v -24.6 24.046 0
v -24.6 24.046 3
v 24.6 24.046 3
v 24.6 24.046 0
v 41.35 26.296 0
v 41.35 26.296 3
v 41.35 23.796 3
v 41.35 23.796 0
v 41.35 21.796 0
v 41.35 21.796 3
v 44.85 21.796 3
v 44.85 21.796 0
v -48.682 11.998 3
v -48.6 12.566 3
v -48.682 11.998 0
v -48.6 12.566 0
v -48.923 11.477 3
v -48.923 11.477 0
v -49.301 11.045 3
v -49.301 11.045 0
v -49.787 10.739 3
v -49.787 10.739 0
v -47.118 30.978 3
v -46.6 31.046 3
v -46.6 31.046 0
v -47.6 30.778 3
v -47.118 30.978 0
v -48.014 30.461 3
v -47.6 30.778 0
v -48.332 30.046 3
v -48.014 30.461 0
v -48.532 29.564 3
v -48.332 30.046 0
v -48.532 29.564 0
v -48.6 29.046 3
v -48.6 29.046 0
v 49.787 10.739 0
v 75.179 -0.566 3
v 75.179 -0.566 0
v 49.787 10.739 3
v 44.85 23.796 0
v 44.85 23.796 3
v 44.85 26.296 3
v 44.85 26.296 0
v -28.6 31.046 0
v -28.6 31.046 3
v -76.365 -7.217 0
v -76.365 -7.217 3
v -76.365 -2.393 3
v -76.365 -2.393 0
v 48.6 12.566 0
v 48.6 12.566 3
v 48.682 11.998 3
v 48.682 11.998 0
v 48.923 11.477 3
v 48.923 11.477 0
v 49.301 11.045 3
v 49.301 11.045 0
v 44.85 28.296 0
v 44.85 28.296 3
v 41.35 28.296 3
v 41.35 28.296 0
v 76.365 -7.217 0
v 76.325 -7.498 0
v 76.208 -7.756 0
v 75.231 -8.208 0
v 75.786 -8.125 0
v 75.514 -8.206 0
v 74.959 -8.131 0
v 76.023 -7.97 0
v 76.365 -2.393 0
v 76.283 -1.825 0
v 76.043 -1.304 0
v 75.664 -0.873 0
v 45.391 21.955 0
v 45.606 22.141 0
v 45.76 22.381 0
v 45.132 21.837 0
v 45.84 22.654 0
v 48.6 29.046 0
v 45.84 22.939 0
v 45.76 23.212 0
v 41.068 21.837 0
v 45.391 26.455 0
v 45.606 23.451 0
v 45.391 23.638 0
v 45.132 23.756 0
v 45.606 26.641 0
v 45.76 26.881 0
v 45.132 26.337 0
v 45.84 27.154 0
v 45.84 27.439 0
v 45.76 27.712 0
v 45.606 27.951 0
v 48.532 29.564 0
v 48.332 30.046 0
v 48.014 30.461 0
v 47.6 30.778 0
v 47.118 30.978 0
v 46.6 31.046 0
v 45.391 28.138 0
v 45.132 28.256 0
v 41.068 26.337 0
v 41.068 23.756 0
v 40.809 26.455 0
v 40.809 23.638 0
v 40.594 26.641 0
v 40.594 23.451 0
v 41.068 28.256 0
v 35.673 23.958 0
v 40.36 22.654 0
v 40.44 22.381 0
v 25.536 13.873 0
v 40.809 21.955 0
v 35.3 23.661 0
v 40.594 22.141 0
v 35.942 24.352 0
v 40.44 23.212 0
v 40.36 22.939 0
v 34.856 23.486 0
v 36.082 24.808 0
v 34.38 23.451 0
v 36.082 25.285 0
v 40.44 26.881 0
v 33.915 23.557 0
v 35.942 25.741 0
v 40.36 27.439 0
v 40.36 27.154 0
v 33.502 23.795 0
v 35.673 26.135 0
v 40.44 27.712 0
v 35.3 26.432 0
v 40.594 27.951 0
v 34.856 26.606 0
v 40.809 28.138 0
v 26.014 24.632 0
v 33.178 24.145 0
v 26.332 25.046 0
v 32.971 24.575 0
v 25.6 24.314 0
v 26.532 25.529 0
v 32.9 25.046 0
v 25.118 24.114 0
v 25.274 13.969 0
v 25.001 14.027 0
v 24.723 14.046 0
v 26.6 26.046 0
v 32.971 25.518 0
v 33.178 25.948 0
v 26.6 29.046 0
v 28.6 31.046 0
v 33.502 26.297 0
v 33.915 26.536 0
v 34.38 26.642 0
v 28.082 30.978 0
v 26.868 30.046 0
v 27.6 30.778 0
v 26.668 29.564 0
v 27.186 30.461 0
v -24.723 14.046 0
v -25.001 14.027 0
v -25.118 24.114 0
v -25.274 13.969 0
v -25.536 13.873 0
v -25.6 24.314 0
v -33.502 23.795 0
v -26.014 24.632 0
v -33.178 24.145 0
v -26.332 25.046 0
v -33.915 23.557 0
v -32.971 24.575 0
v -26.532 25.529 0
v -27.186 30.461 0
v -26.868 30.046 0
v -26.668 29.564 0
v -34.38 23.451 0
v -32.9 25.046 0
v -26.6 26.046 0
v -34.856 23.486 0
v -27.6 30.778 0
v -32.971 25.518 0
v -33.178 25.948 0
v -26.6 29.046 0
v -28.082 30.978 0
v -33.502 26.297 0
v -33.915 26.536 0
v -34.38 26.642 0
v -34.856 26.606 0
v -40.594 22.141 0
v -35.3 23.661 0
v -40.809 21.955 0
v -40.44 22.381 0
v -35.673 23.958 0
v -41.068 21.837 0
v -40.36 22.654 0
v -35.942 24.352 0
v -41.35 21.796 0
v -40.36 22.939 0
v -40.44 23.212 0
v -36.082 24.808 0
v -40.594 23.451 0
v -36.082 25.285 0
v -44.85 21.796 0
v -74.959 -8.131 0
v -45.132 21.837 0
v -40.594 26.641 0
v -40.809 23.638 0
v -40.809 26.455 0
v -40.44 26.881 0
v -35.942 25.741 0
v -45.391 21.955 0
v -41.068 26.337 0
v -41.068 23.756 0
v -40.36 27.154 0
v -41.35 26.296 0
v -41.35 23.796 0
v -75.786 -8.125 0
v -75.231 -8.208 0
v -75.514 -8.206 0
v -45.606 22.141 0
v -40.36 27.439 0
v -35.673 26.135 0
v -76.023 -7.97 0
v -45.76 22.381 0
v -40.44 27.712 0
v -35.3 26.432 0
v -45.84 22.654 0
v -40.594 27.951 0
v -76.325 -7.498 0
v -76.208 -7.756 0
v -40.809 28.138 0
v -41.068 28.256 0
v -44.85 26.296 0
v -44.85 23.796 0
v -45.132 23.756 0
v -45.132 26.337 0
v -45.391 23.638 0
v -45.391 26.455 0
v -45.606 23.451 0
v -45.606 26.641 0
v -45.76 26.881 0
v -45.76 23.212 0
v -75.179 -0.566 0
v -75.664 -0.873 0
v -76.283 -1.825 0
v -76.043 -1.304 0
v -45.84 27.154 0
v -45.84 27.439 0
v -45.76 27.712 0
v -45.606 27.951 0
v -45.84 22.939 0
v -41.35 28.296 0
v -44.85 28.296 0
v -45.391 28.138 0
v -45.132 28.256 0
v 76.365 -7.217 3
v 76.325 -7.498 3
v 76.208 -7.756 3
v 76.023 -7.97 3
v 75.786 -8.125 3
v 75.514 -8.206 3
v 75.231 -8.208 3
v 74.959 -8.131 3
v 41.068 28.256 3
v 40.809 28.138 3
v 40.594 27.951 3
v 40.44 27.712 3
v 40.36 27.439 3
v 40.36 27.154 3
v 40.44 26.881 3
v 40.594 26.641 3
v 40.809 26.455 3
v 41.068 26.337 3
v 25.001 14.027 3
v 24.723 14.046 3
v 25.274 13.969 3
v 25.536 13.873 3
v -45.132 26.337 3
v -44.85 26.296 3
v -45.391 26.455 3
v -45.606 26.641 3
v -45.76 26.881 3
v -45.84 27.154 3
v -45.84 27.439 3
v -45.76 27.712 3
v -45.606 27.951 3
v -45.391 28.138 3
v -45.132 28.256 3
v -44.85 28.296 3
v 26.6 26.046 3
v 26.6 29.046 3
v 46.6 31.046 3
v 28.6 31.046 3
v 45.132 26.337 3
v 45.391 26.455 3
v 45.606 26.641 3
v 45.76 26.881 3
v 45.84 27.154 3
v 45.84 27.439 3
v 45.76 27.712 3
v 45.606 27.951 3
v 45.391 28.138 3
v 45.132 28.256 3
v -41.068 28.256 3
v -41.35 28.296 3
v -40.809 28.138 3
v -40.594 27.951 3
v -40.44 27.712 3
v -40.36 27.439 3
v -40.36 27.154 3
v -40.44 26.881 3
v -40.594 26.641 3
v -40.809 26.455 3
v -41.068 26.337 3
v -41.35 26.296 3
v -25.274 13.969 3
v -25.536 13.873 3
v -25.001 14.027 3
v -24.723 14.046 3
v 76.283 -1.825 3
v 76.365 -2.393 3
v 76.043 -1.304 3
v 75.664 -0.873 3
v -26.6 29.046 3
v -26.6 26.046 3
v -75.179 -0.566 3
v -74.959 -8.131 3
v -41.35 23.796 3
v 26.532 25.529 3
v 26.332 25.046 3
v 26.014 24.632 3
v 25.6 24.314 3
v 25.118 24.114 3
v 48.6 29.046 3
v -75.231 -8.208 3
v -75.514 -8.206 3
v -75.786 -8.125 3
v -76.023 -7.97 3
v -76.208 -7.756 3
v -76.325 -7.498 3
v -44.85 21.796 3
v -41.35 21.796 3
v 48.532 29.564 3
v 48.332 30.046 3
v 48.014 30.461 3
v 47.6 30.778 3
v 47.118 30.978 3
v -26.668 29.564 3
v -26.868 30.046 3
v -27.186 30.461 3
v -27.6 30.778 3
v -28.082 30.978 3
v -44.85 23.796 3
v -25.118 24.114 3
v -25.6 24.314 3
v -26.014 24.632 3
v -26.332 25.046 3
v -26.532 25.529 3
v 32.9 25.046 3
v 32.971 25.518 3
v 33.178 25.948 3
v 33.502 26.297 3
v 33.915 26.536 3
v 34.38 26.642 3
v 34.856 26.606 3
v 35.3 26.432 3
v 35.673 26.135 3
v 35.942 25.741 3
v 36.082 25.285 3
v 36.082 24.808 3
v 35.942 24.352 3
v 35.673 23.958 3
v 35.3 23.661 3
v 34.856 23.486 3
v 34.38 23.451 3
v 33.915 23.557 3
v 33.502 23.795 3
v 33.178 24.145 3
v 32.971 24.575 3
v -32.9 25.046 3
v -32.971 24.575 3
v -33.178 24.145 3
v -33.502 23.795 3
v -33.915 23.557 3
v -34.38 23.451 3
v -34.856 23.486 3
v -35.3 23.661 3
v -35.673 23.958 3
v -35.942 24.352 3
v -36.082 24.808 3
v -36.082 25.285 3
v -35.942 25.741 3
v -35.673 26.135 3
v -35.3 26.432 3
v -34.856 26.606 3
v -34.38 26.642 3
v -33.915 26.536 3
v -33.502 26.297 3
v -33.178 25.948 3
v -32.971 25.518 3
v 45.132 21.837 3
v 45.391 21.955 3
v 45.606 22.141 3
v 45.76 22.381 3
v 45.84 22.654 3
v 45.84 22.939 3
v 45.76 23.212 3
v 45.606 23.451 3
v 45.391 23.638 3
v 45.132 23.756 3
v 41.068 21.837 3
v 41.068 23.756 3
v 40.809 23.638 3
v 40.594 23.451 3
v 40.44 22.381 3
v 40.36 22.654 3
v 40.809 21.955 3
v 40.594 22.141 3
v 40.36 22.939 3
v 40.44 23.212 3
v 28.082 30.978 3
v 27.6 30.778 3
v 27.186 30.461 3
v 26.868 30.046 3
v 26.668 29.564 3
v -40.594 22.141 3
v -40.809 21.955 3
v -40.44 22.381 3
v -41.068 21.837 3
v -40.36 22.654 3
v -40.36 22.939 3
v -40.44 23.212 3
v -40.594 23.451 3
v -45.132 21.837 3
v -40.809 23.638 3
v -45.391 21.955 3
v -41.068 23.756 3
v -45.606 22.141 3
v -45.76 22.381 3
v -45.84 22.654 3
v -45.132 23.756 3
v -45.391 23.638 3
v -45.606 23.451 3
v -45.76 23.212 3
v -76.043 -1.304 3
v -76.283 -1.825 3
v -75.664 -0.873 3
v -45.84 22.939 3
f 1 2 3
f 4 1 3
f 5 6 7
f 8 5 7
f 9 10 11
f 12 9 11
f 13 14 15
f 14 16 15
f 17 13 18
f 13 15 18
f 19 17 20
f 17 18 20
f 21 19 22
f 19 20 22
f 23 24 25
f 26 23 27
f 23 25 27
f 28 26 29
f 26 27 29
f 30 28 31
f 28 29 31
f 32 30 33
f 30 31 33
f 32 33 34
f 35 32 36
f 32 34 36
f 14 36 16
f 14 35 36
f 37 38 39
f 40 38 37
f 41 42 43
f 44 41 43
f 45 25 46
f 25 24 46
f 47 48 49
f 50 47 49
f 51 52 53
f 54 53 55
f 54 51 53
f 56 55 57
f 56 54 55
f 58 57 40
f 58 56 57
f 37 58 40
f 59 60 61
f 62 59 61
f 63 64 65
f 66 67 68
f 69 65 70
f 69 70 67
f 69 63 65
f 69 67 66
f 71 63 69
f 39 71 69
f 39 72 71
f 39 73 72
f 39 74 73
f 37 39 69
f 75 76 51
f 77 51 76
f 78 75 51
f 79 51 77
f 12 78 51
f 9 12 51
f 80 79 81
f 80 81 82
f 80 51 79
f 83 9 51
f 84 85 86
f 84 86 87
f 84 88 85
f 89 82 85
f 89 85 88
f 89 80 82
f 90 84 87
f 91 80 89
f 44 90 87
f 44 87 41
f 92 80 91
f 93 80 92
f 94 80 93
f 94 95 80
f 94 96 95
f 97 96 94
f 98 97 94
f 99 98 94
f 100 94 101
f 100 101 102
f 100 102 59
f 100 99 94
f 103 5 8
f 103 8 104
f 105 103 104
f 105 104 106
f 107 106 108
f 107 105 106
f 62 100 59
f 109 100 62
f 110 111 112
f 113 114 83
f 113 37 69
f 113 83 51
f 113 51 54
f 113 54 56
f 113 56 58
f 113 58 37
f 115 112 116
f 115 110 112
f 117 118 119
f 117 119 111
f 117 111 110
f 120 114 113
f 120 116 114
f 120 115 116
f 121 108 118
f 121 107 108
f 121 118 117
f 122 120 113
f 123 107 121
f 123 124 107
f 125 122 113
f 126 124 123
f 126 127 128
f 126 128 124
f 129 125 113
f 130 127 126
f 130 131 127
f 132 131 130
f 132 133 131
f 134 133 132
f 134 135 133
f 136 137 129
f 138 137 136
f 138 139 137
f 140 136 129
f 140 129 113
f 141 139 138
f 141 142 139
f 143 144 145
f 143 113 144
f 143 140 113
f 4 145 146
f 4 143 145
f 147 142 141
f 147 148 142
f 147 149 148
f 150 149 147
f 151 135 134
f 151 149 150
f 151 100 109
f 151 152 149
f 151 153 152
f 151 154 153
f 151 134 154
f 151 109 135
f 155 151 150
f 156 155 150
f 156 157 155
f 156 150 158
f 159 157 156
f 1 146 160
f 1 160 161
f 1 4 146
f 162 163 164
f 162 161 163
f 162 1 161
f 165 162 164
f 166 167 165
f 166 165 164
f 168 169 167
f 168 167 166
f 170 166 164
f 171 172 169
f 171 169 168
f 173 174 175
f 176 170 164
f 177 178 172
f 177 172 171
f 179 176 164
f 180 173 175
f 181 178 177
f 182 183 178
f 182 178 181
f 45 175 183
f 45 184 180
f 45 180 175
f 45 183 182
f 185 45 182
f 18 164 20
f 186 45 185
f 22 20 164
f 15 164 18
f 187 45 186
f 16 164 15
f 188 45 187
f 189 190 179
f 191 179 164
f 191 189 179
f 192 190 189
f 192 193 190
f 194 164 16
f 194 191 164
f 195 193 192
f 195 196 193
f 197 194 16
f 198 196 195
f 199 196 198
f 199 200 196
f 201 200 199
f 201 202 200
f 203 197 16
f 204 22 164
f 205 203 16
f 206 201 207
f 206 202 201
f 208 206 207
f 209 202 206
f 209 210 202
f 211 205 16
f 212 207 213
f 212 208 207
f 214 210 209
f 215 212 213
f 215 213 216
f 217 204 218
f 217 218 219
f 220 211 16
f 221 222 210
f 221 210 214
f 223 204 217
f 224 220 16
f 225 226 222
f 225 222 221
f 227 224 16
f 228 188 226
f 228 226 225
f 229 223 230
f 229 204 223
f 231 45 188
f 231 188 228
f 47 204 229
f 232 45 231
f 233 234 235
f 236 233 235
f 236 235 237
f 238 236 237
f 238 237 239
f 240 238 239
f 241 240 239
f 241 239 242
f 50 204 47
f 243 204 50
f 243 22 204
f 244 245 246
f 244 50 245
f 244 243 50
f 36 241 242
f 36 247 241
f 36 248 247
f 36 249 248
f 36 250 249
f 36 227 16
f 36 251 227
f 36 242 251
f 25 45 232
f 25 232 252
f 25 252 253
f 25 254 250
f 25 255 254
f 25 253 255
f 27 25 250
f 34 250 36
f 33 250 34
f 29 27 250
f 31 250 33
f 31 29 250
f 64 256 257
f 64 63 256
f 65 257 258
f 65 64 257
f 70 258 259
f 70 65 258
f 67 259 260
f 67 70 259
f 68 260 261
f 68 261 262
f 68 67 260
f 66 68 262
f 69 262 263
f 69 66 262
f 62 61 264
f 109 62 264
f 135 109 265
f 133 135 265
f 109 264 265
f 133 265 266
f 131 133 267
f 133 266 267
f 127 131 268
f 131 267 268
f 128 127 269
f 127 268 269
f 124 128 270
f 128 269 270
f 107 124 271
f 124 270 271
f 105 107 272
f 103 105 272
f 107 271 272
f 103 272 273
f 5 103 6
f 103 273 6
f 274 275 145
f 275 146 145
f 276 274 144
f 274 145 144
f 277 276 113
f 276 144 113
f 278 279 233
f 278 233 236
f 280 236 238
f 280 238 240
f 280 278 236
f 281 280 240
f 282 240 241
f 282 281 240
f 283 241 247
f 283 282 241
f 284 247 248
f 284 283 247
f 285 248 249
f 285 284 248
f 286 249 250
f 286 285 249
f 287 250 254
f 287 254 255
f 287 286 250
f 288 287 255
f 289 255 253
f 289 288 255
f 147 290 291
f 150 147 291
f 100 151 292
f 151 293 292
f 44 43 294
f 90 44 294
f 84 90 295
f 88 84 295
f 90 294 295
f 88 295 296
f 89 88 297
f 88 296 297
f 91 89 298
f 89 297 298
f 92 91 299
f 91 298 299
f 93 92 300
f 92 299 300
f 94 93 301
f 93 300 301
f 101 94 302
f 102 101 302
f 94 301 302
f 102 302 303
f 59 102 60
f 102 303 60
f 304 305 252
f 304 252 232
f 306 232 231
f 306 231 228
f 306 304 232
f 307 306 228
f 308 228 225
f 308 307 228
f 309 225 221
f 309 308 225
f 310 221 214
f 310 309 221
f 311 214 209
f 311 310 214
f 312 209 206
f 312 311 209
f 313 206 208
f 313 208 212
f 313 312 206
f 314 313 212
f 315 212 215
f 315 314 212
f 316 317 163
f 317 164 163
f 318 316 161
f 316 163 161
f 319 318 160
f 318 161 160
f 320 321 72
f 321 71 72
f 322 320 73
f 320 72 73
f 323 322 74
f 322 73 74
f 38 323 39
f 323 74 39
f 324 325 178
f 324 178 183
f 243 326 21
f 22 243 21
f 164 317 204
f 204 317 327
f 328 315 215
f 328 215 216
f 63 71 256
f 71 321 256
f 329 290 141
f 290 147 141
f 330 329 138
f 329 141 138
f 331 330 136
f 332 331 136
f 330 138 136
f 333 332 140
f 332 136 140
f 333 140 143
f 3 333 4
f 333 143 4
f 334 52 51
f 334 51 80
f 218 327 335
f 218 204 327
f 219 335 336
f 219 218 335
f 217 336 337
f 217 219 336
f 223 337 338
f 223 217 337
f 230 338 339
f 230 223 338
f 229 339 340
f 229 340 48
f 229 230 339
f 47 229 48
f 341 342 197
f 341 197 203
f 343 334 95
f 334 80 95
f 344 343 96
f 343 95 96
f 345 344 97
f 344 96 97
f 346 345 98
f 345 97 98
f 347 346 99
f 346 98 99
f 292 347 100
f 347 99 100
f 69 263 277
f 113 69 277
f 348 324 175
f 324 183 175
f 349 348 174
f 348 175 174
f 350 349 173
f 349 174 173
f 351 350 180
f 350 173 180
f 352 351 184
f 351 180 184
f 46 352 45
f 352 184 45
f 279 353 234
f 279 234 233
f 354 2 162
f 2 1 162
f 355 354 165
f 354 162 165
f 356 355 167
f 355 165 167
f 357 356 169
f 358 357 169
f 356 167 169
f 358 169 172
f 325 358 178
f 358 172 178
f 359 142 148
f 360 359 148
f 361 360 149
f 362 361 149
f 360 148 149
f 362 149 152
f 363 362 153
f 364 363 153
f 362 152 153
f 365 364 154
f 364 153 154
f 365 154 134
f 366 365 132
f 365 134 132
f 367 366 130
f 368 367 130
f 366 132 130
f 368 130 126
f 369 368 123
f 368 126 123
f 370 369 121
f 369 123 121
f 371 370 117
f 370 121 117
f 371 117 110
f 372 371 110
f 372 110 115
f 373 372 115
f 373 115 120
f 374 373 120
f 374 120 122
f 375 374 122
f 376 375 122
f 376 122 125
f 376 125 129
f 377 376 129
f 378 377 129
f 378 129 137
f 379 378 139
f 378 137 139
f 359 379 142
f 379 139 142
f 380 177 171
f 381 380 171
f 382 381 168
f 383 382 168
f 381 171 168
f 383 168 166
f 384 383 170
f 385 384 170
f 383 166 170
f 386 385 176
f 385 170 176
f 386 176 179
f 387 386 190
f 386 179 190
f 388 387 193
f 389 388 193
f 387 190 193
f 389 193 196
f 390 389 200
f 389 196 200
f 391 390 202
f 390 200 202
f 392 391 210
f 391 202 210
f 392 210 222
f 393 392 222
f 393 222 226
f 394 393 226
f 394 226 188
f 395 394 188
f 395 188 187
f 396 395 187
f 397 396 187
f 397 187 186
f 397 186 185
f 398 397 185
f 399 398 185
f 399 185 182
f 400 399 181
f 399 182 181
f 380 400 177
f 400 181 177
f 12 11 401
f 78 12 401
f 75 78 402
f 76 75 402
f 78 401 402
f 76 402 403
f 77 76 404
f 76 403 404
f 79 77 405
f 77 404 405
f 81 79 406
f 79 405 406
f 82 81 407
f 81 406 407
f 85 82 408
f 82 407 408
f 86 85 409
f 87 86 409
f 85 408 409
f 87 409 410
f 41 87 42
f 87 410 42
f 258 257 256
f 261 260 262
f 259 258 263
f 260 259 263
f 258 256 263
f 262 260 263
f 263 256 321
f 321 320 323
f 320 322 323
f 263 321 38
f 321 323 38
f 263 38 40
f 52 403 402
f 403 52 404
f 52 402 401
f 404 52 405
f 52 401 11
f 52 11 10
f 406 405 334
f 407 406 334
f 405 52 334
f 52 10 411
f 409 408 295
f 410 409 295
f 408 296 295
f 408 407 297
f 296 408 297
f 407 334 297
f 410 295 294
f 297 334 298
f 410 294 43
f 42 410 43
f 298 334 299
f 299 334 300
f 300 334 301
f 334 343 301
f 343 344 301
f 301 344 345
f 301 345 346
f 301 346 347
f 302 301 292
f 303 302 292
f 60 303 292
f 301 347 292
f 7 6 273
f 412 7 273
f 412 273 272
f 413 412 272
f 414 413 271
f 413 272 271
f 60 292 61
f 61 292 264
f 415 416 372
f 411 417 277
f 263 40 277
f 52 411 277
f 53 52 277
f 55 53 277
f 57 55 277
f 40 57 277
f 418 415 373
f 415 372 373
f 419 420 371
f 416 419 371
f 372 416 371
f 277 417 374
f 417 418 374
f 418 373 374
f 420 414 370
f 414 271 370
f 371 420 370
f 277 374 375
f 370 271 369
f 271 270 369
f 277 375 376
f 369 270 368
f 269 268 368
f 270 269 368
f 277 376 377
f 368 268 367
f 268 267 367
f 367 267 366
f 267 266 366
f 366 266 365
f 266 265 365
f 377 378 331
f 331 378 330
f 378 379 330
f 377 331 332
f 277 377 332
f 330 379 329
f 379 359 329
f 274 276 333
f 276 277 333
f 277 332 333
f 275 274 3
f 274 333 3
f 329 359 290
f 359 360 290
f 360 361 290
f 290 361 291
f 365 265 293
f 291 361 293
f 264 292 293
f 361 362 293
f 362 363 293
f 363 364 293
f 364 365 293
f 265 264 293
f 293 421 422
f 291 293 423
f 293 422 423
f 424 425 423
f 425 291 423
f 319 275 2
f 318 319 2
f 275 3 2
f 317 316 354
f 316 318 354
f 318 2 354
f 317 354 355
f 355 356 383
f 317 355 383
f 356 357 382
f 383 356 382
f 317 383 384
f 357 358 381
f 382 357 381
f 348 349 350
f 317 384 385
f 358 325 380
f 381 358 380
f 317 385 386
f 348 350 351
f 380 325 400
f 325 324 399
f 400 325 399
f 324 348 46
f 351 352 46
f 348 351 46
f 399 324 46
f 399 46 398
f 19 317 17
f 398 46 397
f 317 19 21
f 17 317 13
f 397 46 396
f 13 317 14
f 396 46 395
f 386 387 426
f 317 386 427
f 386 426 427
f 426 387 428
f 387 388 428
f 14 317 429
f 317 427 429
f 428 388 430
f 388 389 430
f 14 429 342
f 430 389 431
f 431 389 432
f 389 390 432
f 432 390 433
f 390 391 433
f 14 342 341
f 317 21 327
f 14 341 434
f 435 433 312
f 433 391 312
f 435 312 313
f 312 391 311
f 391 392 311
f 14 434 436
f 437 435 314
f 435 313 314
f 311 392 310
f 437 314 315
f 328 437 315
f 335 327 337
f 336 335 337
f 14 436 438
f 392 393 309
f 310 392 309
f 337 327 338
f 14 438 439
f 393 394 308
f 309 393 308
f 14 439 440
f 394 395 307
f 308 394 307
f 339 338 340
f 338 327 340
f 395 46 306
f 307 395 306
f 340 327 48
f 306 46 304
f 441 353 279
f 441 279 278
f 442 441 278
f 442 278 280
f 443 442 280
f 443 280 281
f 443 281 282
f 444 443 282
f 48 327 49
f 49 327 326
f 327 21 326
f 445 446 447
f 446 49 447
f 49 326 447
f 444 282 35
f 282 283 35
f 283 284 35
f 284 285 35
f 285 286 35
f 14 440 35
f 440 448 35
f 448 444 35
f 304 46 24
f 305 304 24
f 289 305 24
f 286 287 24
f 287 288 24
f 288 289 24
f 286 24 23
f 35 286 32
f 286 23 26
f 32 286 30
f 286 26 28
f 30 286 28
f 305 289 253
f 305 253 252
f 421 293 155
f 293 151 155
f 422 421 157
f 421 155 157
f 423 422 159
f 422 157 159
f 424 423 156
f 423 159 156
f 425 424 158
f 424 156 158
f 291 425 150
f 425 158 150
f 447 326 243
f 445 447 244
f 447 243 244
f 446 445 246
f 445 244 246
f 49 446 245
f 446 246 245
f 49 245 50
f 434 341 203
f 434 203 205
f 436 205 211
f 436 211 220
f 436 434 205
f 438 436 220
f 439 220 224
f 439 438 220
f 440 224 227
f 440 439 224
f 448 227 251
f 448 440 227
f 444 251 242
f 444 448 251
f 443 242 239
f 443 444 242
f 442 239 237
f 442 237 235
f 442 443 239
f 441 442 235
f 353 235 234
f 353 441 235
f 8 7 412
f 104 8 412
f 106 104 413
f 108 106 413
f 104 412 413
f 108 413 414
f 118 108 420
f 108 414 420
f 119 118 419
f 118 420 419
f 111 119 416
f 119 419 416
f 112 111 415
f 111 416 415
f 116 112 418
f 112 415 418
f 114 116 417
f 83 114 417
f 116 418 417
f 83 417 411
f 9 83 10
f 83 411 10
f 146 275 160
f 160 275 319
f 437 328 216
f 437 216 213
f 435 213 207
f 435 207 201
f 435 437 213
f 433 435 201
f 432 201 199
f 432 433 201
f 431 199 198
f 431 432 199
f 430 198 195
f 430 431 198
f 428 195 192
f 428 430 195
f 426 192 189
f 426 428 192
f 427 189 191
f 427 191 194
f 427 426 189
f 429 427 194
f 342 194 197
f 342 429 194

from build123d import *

# Parameters (mm, degrees)
EXTRUDE_1_DEPTH     = 3
SKETCH_2_W          = 83.2
SKETCH_2_H          = 9
EXTRUDE_2_DEPTH     = 3
SKETCH_3_W          = 42.77133807
SKETCH_3_H          = 9.521513309
CUT_EXTRUDE_1_DEPTH = 3
EXTRUDE_3_DEPTH     = 3
CUT_EXTRUDE_2_DEPTH = 3
EXTRUDE_4_DEPTH     = 3
SKETCH_6_R          = 1.6
CUT_EXTRUDE_3_DEPTH = 3
SKETCH_8_W          = 53.2
SKETCH_8_H          = 7
CUT_EXTRUDE_4_DEPTH = 10
FILLET_2_R          = 2
FILLET_3_R          = 1


with BuildPart() as part:
    # 草图1 → 凸台-拉伸1 (new body)
    with BuildSketch(Plane.XY):
        Polygon((76.365250313, 0), (0, 34), (-76.365250313, 0), (-76.365250313, 6.567817671), (0, 40.567817671), (76.365250313, 6.567817671), align=None)
    extrude(amount=EXTRUDE_1_DEPTH)

    # 草图2 → 凸台-拉伸2 (add)
    with BuildSketch(Plane.XY.offset(3)):
        with Locations((0, 26.546304362)):
            Rectangle(SKETCH_2_W, SKETCH_2_H)
    extrude(amount=-EXTRUDE_2_DEPTH)

    # 草图3 → 切除-拉伸1 (cut)
    with BuildSketch(Plane.XY.offset(3)):
        with Locations((0, 35.807061017)):
            Rectangle(SKETCH_3_W, SKETCH_3_H)
    extrude(amount=-CUT_EXTRUDE_1_DEPTH, mode=Mode.SUBTRACT)

    # 草图4 → 凸台-拉伸3 (add)
    with BuildSketch(Plane.XY.offset(3)):
        Polygon((41.6, 31.046304362), (48.6, 31.046304362), (48.6, 18.929703565), (41.6, 22.046304362), align=None)
        Polygon((-41.6, 31.046304362), (-48.6, 31.046304362), (-48.6, 18.929703565), (-41.6, 22.046304362), align=None)
    extrude(amount=-EXTRUDE_3_DEPTH)

    # 草图5 → 切除-拉伸2 (cut)
    with BuildSketch(Plane.XY.offset(3)):
        with BuildLine():
            Line((-44.85, 28.296304362), (-41.35, 28.296304362))
            ThreePointArc((-41.35, 28.296304362), (-40.35, 27.296304362), (-41.35, 26.296304362))
            Line((-41.35, 26.296304362), (-41.35, 23.796304362))
            ThreePointArc((-41.35, 23.796304362), (-40.35, 22.796304362), (-41.35, 21.796304362))
            Line((-41.35, 21.796304362), (-44.85, 21.796304362))
            ThreePointArc((-44.85, 21.796304362), (-45.85, 22.796304362), (-44.85, 23.796304362))
            Line((-44.85, 23.796304362), (-44.85, 26.296304362))
            ThreePointArc((-44.85, 26.296304362), (-45.85, 27.296304362), (-44.85, 28.296304362))
        make_face()
        with BuildLine():
            Line((41.35, 26.296304362), (41.35, 23.796304362))
            ThreePointArc((41.35, 23.796304362), (40.35, 22.796304362), (41.35, 21.796304362))
            Line((41.35, 21.796304362), (44.85, 21.796304362))
            ThreePointArc((44.85, 21.796304362), (45.85, 22.796304362), (44.85, 23.796304362))
            Line((44.85, 23.796304362), (44.85, 26.296304362))
            ThreePointArc((44.85, 26.296304362), (45.85, 27.296304362), (44.85, 28.296304362))
            Line((44.85, 28.296304362), (41.35, 28.296304362))
            ThreePointArc((41.35, 28.296304362), (40.35, 27.296304362), (41.35, 26.296304362))
        make_face()
    extrude(amount=-CUT_EXTRUDE_2_DEPTH, mode=Mode.SUBTRACT)

    # 草图7 → 凸台-拉伸4 (add)
    with BuildSketch(Plane.XY.offset(3)):
        Polygon((26.848439987, 22.046304362), (76.365250313, 0), (76.365250313, -8.757090228), (25.147987493, 14.046304362), (-25.147987493, 14.046304362), (-76.365250313, -8.757090228), (-76.365250313, 0), (-26.848439987, 22.046304362), align=None)
    extrude(amount=-EXTRUDE_4_DEPTH)

    # 草图6 → 切除-拉伸3 (cut)
    with BuildSketch(Plane(origin=(0, 0, 0), x_dir=(-1, 0, 0), z_dir=(0, 0, -1))):
        with Locations((-34.5, 25.046304362)):
            Circle(SKETCH_6_R)
        with Locations(Location((34.5, 25.046304362, 0), (0, 0, 180))):
            Circle(SKETCH_6_R)
    extrude(amount=-CUT_EXTRUDE_3_DEPTH, mode=Mode.SUBTRACT)

    # 草图8 → 切除-拉伸4 (cut)
    with BuildSketch(Plane.XY.offset(3)):
        Polygon((-76.365250313, -1.094636279), (-48.6, 11.267249615), (-48.6, 18.929703565), (-76.365250313, 6.567817671), align=None)
        with Locations((0, 27.546304362)):
            Rectangle(SKETCH_8_W, SKETCH_8_H)
        Polygon((48.6, 18.929703565), (76.365250313, 6.567817671), (76.365250313, -1.094636279), (48.6, 11.267249615), align=None)
    extrude(amount=-CUT_EXTRUDE_4_DEPTH, mode=Mode.SUBTRACT)

    # 圆角2
    fillet_2_edges = [part.edges().sort_by_distance(p)[0] for p in [
        (25.147987493, 14.046304362, 1.5),
        (-25.147987493, 14.046304362, 1.5),
        (-26.6, 31.046304362, 1.5),
        (26.6, 31.046304362, 1.5),
        (-76.365250313, -1.094636279, 1.5),
        (-48.6, 11.267249615, 1.5),
        (26.6, 24.046304362, 1.5),
        (-26.6, 24.046304362, 1.5),
        (48.6, 11.267249615, 1.5),
        (76.365250313, -1.094636279, 1.5),
        (48.6, 31.046304362, 1.5),
        (-48.6, 31.046304362, 1.5),
    ]]
    fillet(fillet_2_edges, radius=FILLET_2_R)

    # 圆角3
    fillet_3_edges = [part.edges().sort_by_distance(p)[0] for p in [
        (76.365250313, -8.757090228, 1.5),
        (-76.365250313, -8.757090228, 1.5),
    ]]
    fillet(fillet_3_edges, radius=FILLET_3_R)


solid = part.part
